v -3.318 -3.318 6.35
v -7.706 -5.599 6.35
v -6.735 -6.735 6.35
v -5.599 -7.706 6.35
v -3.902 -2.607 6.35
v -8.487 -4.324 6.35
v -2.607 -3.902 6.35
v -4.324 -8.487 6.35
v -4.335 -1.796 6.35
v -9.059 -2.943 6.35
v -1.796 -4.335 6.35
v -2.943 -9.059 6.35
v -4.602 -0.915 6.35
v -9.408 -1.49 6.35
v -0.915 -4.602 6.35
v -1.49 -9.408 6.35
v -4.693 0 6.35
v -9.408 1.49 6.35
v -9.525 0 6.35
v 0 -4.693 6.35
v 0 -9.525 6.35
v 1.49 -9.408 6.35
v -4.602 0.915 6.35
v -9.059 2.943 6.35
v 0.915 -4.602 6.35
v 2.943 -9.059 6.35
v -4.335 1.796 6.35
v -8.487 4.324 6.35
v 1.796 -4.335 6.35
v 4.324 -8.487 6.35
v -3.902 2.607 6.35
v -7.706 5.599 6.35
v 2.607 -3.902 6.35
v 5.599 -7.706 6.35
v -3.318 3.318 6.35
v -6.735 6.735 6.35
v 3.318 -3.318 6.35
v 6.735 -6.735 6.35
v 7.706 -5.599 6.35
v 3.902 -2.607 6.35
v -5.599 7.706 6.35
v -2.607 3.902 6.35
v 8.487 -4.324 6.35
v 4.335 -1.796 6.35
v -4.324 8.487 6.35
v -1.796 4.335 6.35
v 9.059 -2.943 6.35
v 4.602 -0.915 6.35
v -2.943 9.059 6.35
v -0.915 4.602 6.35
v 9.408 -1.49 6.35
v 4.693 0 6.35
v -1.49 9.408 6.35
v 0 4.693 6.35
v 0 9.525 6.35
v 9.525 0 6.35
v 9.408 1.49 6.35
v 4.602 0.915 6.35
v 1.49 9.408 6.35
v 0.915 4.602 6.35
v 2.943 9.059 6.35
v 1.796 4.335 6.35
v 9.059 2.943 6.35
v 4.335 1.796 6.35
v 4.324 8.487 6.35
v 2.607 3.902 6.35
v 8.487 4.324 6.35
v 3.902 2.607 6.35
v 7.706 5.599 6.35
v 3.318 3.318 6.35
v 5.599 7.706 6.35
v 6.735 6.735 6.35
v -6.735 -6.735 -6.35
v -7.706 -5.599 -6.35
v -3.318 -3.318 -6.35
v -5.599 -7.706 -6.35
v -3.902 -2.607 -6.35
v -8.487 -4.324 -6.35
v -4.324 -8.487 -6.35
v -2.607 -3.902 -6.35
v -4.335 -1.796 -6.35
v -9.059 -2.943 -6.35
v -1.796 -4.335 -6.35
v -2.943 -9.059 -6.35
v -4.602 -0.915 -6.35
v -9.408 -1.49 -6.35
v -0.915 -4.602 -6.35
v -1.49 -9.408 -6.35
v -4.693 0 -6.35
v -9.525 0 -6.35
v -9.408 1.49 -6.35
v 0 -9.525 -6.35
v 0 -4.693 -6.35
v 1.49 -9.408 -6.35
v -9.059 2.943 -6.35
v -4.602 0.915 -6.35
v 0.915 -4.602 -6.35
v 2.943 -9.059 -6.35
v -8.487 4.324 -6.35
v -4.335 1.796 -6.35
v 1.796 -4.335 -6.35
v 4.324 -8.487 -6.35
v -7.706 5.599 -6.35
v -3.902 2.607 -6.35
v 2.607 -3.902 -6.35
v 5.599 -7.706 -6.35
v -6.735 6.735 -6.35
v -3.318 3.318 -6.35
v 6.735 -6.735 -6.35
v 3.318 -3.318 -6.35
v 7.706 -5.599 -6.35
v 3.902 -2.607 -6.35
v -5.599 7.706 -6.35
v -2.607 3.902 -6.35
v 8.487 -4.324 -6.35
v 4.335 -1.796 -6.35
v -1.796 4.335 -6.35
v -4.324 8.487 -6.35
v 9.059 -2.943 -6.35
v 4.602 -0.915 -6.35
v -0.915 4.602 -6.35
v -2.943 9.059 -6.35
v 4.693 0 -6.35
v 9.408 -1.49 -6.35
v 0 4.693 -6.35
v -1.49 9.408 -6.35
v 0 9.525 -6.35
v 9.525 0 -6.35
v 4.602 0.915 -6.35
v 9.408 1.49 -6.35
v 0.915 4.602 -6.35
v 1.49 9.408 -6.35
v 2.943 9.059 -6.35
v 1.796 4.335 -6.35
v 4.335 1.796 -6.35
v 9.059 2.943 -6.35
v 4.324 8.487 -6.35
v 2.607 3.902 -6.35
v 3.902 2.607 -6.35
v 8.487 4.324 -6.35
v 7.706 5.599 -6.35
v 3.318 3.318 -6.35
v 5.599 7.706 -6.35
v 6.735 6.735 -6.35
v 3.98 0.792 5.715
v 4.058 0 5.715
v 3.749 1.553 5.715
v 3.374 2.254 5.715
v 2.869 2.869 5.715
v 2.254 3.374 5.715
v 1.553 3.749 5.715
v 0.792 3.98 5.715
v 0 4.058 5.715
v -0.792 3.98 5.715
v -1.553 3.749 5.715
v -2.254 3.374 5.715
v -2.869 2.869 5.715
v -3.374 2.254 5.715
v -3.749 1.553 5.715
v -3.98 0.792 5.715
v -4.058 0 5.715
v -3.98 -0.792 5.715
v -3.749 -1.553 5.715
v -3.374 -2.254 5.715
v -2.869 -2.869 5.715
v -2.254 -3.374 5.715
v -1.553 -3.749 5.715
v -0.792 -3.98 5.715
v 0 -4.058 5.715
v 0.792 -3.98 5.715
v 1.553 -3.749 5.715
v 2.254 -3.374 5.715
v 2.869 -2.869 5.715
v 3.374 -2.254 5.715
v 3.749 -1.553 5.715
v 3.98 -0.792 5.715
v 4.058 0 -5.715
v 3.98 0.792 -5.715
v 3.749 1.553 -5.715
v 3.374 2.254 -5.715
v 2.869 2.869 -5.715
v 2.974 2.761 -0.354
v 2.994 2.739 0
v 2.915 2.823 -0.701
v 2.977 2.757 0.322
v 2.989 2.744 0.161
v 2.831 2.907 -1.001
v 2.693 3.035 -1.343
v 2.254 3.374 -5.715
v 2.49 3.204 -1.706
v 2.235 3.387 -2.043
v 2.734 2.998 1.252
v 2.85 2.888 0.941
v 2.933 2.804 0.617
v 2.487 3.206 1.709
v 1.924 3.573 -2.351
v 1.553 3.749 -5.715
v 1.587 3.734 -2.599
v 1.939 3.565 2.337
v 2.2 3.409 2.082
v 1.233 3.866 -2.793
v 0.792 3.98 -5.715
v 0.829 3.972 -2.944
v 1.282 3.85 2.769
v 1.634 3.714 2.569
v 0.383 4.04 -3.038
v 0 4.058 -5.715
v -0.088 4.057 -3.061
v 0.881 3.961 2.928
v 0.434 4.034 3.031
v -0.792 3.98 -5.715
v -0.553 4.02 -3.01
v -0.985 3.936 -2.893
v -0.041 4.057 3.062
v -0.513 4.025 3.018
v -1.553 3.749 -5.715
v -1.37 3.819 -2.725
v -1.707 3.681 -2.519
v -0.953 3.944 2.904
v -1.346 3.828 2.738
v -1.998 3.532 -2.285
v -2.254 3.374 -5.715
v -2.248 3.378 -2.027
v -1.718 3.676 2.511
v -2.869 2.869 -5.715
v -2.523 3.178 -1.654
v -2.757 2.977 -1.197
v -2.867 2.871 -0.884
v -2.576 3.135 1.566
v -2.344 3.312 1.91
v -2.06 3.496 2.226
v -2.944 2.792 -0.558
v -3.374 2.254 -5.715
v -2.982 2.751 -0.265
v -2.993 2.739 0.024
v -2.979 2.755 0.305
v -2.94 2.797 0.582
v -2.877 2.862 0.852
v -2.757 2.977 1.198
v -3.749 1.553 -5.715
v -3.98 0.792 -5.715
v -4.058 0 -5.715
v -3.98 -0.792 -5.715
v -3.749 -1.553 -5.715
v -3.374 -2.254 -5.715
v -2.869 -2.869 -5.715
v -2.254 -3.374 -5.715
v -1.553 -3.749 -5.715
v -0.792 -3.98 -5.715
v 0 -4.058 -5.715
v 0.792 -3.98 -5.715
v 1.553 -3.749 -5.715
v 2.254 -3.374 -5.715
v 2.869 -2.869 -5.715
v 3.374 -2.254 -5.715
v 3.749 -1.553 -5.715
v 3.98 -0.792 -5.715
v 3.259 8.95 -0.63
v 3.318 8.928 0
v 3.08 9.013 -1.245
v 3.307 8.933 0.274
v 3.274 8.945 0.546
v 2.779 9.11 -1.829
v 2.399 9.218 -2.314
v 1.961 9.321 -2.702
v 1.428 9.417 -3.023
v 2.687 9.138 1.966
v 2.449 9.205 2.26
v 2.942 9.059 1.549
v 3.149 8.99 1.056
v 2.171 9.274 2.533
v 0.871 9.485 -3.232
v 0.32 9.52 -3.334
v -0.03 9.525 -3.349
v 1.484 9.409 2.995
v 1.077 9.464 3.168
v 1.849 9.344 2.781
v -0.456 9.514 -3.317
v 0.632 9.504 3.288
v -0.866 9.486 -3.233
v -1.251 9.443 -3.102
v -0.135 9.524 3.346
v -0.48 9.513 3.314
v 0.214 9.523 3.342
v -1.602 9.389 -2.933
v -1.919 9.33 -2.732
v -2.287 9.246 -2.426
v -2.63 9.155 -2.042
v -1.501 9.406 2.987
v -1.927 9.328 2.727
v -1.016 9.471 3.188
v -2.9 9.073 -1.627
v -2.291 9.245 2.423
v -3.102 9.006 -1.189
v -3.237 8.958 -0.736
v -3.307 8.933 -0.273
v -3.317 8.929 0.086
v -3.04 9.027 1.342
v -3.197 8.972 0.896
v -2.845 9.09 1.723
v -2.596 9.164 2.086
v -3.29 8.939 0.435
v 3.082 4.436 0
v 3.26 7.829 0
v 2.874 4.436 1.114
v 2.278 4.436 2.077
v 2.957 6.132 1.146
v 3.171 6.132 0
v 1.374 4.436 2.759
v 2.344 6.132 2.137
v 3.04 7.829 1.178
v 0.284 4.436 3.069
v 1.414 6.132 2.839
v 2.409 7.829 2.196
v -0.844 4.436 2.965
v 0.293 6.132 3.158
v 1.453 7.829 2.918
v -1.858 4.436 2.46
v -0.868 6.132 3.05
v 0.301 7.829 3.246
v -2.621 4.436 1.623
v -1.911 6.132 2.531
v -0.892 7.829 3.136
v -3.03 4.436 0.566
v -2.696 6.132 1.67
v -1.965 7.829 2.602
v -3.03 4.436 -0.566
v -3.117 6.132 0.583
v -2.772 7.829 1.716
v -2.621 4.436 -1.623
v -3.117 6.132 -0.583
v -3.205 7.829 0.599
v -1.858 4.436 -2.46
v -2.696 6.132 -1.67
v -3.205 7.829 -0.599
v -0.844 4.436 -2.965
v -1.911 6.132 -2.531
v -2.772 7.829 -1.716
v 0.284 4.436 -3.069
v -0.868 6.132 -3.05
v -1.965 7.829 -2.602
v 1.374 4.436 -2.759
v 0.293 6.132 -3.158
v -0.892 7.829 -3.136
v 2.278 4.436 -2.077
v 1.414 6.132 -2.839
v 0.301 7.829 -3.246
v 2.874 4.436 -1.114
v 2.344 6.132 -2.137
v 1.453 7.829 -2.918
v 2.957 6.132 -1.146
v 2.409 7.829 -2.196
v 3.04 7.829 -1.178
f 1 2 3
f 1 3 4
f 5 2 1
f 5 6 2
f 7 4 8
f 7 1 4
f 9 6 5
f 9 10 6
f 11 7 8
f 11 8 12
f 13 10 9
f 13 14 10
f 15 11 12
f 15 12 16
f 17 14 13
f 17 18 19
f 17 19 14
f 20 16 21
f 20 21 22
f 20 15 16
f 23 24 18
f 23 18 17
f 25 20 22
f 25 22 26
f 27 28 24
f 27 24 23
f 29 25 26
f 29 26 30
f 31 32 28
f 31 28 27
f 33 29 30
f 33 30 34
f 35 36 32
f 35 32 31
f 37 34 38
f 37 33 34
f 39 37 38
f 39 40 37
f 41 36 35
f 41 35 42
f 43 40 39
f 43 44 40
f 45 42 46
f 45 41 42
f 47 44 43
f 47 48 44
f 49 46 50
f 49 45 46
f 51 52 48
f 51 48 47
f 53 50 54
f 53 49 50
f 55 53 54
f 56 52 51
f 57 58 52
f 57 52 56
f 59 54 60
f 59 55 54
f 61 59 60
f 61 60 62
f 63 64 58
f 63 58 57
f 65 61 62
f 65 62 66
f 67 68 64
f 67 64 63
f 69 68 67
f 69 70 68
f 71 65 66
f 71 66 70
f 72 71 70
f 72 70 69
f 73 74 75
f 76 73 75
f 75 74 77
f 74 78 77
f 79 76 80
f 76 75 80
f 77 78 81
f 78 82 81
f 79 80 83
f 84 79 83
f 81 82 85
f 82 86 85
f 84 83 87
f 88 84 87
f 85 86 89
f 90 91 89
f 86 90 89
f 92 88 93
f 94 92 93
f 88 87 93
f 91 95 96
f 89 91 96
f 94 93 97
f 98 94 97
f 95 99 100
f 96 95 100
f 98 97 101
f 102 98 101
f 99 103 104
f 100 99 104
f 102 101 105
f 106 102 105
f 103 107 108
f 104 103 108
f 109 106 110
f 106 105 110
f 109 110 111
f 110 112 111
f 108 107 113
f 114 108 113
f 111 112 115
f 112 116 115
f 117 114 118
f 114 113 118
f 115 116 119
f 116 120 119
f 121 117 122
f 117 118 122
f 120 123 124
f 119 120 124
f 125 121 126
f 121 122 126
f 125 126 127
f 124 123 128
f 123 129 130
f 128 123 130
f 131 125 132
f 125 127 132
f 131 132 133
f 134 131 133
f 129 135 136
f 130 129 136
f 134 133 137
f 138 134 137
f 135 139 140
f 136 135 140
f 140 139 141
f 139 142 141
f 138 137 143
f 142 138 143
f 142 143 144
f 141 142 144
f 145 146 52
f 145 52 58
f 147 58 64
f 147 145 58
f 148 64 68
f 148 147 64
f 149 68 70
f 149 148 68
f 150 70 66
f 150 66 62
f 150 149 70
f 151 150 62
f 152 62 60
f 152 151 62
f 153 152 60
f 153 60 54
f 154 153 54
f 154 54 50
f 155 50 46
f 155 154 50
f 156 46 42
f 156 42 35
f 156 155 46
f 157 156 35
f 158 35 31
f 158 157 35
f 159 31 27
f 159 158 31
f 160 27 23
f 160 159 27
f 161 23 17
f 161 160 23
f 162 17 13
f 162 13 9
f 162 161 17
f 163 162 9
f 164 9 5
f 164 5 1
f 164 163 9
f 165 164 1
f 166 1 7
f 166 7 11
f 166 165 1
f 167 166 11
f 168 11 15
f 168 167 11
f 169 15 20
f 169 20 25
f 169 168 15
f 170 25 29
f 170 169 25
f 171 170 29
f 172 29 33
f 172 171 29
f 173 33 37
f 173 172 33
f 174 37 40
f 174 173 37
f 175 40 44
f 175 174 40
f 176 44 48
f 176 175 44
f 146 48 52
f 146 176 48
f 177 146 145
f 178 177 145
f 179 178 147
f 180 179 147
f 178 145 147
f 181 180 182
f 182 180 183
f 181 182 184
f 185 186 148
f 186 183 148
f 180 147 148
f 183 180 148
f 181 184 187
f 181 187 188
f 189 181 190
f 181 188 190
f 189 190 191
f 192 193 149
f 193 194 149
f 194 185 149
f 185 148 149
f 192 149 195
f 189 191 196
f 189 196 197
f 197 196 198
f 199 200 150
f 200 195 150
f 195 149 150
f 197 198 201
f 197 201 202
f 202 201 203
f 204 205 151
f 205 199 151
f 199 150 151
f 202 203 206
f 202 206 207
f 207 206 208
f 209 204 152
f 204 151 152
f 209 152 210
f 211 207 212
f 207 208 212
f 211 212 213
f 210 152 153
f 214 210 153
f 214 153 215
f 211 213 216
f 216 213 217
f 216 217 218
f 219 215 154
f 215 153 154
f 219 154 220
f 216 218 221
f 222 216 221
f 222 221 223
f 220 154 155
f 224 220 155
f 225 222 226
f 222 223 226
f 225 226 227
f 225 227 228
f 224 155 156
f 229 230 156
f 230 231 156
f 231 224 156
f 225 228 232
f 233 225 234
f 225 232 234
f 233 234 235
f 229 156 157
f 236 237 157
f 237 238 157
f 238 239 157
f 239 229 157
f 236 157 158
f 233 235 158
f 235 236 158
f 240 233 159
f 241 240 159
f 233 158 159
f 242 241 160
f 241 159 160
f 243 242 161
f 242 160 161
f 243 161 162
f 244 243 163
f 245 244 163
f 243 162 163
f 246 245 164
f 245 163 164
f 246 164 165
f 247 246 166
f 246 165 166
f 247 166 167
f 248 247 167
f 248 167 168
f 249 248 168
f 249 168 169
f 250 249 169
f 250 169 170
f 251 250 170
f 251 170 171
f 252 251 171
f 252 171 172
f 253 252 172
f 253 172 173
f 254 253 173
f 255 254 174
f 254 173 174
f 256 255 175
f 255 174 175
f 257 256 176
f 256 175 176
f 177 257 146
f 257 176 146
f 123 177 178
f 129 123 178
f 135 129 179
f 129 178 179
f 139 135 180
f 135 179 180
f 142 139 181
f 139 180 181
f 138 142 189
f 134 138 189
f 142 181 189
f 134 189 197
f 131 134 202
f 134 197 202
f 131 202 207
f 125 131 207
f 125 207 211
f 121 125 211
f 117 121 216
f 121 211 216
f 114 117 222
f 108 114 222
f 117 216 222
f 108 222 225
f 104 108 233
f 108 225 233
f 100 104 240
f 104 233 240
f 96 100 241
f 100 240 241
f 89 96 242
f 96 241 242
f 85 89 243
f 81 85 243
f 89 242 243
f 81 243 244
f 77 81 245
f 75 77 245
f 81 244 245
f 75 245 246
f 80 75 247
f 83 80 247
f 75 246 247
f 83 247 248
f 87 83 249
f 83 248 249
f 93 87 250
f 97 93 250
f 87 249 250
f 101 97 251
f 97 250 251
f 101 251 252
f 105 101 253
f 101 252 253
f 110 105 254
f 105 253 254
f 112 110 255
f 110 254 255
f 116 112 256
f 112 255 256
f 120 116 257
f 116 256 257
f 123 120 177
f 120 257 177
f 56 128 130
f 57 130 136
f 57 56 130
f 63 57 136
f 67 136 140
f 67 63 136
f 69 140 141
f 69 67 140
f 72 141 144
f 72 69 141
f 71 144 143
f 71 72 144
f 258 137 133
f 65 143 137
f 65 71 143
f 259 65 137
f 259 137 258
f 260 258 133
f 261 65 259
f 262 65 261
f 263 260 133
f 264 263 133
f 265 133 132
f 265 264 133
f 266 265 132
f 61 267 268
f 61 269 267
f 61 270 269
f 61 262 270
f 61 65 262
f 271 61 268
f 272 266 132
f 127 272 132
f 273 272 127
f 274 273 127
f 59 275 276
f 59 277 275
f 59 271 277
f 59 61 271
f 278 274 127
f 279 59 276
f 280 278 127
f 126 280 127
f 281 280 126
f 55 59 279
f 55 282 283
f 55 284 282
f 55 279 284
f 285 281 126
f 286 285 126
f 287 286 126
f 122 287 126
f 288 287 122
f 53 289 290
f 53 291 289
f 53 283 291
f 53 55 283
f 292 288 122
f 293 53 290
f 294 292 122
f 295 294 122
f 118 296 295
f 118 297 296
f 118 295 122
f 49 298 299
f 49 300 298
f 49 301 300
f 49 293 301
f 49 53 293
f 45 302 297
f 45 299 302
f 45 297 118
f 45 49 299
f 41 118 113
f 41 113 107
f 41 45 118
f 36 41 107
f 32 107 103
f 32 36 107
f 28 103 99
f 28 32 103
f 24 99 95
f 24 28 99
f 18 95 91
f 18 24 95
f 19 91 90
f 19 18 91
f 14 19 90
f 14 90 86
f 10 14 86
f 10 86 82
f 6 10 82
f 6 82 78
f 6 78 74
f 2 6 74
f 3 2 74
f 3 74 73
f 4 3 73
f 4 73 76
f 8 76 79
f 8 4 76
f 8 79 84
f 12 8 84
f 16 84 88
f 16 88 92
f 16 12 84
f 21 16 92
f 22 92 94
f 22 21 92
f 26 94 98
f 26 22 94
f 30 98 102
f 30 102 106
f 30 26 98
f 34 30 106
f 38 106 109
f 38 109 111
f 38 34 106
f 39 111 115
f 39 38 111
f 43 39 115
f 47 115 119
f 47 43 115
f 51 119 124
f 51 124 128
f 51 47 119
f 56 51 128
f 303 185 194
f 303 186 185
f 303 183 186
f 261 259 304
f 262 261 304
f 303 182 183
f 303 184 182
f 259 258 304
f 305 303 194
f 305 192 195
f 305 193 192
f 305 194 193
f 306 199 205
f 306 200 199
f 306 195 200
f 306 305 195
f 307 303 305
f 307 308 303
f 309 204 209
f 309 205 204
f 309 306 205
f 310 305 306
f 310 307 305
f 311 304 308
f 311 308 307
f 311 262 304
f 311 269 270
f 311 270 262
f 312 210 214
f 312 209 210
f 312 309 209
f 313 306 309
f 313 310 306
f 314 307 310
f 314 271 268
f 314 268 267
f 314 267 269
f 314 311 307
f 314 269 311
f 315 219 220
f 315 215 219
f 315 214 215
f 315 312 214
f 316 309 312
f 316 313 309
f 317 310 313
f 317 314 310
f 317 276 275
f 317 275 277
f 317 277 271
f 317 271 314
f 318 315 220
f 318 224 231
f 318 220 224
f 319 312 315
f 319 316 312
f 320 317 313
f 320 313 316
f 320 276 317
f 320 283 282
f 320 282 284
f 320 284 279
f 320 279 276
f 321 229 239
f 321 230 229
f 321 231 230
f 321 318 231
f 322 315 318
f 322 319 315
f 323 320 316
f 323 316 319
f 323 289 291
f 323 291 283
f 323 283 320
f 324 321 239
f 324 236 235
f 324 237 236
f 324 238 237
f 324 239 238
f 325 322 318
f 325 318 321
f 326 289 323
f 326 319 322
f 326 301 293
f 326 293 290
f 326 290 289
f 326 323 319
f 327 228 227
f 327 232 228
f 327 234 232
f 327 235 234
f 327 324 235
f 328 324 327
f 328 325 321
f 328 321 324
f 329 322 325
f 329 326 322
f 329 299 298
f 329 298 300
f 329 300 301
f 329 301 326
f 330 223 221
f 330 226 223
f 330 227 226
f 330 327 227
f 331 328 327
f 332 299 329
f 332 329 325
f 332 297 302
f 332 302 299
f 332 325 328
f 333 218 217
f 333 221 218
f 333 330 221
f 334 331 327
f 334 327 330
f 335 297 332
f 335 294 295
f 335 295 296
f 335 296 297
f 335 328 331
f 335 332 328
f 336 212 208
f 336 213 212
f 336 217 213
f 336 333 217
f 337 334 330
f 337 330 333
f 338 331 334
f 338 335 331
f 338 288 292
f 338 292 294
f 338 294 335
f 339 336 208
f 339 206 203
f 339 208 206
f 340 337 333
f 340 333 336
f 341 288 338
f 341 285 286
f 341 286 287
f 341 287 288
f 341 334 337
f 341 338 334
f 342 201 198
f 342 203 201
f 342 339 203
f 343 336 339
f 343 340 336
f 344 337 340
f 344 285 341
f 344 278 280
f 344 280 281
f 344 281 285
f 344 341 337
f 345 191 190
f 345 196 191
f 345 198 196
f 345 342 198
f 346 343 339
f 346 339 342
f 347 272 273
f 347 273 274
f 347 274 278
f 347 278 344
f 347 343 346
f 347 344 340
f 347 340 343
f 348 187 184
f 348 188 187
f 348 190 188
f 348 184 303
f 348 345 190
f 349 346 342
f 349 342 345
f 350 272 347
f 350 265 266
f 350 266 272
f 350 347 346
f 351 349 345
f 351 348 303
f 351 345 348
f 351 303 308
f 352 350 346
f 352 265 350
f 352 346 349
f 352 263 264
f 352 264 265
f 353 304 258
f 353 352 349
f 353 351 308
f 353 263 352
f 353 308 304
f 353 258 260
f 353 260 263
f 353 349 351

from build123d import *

# Parameters (mm, degrees)
F0_R     = 9.525
F1_DEPTH = 6.35
F2_R     = 4.05765
F3_DEPTH = 12.7
F4_R     = 2.85
F5_DEPTH = 9.526
F5_TAPER = -3
F6_SIZE  = 0.635


with BuildPart() as f1:
    # F0 (on Top) → F1 (new body, symmetric)
    with BuildSketch(Plane.XY):
        Circle(F0_R)
    extrude(amount=F1_DEPTH, both=True)

    # F2 (on Top) → F3 (cut, symmetric)
    with BuildSketch(Plane.XY):
        Circle(F2_R)
    extrude(amount=F3_DEPTH, both=True, mode=Mode.SUBTRACT)

    # F4 (on Front) → F5 (cut, through all)
    with BuildSketch(Plane.XZ):
        Circle(F4_R)
    extrude(amount=-F5_DEPTH, taper=F5_TAPER, mode=Mode.SUBTRACT)

    # F6
    f6_edges = [f1.edges().sort_by_distance(p)[0] for p in [
        (-4.05765, 0, -6.35),
        (-4.05765, 0, 6.35),
    ]]
    chamfer(f6_edges, length=F6_SIZE)


solid = f1.part
